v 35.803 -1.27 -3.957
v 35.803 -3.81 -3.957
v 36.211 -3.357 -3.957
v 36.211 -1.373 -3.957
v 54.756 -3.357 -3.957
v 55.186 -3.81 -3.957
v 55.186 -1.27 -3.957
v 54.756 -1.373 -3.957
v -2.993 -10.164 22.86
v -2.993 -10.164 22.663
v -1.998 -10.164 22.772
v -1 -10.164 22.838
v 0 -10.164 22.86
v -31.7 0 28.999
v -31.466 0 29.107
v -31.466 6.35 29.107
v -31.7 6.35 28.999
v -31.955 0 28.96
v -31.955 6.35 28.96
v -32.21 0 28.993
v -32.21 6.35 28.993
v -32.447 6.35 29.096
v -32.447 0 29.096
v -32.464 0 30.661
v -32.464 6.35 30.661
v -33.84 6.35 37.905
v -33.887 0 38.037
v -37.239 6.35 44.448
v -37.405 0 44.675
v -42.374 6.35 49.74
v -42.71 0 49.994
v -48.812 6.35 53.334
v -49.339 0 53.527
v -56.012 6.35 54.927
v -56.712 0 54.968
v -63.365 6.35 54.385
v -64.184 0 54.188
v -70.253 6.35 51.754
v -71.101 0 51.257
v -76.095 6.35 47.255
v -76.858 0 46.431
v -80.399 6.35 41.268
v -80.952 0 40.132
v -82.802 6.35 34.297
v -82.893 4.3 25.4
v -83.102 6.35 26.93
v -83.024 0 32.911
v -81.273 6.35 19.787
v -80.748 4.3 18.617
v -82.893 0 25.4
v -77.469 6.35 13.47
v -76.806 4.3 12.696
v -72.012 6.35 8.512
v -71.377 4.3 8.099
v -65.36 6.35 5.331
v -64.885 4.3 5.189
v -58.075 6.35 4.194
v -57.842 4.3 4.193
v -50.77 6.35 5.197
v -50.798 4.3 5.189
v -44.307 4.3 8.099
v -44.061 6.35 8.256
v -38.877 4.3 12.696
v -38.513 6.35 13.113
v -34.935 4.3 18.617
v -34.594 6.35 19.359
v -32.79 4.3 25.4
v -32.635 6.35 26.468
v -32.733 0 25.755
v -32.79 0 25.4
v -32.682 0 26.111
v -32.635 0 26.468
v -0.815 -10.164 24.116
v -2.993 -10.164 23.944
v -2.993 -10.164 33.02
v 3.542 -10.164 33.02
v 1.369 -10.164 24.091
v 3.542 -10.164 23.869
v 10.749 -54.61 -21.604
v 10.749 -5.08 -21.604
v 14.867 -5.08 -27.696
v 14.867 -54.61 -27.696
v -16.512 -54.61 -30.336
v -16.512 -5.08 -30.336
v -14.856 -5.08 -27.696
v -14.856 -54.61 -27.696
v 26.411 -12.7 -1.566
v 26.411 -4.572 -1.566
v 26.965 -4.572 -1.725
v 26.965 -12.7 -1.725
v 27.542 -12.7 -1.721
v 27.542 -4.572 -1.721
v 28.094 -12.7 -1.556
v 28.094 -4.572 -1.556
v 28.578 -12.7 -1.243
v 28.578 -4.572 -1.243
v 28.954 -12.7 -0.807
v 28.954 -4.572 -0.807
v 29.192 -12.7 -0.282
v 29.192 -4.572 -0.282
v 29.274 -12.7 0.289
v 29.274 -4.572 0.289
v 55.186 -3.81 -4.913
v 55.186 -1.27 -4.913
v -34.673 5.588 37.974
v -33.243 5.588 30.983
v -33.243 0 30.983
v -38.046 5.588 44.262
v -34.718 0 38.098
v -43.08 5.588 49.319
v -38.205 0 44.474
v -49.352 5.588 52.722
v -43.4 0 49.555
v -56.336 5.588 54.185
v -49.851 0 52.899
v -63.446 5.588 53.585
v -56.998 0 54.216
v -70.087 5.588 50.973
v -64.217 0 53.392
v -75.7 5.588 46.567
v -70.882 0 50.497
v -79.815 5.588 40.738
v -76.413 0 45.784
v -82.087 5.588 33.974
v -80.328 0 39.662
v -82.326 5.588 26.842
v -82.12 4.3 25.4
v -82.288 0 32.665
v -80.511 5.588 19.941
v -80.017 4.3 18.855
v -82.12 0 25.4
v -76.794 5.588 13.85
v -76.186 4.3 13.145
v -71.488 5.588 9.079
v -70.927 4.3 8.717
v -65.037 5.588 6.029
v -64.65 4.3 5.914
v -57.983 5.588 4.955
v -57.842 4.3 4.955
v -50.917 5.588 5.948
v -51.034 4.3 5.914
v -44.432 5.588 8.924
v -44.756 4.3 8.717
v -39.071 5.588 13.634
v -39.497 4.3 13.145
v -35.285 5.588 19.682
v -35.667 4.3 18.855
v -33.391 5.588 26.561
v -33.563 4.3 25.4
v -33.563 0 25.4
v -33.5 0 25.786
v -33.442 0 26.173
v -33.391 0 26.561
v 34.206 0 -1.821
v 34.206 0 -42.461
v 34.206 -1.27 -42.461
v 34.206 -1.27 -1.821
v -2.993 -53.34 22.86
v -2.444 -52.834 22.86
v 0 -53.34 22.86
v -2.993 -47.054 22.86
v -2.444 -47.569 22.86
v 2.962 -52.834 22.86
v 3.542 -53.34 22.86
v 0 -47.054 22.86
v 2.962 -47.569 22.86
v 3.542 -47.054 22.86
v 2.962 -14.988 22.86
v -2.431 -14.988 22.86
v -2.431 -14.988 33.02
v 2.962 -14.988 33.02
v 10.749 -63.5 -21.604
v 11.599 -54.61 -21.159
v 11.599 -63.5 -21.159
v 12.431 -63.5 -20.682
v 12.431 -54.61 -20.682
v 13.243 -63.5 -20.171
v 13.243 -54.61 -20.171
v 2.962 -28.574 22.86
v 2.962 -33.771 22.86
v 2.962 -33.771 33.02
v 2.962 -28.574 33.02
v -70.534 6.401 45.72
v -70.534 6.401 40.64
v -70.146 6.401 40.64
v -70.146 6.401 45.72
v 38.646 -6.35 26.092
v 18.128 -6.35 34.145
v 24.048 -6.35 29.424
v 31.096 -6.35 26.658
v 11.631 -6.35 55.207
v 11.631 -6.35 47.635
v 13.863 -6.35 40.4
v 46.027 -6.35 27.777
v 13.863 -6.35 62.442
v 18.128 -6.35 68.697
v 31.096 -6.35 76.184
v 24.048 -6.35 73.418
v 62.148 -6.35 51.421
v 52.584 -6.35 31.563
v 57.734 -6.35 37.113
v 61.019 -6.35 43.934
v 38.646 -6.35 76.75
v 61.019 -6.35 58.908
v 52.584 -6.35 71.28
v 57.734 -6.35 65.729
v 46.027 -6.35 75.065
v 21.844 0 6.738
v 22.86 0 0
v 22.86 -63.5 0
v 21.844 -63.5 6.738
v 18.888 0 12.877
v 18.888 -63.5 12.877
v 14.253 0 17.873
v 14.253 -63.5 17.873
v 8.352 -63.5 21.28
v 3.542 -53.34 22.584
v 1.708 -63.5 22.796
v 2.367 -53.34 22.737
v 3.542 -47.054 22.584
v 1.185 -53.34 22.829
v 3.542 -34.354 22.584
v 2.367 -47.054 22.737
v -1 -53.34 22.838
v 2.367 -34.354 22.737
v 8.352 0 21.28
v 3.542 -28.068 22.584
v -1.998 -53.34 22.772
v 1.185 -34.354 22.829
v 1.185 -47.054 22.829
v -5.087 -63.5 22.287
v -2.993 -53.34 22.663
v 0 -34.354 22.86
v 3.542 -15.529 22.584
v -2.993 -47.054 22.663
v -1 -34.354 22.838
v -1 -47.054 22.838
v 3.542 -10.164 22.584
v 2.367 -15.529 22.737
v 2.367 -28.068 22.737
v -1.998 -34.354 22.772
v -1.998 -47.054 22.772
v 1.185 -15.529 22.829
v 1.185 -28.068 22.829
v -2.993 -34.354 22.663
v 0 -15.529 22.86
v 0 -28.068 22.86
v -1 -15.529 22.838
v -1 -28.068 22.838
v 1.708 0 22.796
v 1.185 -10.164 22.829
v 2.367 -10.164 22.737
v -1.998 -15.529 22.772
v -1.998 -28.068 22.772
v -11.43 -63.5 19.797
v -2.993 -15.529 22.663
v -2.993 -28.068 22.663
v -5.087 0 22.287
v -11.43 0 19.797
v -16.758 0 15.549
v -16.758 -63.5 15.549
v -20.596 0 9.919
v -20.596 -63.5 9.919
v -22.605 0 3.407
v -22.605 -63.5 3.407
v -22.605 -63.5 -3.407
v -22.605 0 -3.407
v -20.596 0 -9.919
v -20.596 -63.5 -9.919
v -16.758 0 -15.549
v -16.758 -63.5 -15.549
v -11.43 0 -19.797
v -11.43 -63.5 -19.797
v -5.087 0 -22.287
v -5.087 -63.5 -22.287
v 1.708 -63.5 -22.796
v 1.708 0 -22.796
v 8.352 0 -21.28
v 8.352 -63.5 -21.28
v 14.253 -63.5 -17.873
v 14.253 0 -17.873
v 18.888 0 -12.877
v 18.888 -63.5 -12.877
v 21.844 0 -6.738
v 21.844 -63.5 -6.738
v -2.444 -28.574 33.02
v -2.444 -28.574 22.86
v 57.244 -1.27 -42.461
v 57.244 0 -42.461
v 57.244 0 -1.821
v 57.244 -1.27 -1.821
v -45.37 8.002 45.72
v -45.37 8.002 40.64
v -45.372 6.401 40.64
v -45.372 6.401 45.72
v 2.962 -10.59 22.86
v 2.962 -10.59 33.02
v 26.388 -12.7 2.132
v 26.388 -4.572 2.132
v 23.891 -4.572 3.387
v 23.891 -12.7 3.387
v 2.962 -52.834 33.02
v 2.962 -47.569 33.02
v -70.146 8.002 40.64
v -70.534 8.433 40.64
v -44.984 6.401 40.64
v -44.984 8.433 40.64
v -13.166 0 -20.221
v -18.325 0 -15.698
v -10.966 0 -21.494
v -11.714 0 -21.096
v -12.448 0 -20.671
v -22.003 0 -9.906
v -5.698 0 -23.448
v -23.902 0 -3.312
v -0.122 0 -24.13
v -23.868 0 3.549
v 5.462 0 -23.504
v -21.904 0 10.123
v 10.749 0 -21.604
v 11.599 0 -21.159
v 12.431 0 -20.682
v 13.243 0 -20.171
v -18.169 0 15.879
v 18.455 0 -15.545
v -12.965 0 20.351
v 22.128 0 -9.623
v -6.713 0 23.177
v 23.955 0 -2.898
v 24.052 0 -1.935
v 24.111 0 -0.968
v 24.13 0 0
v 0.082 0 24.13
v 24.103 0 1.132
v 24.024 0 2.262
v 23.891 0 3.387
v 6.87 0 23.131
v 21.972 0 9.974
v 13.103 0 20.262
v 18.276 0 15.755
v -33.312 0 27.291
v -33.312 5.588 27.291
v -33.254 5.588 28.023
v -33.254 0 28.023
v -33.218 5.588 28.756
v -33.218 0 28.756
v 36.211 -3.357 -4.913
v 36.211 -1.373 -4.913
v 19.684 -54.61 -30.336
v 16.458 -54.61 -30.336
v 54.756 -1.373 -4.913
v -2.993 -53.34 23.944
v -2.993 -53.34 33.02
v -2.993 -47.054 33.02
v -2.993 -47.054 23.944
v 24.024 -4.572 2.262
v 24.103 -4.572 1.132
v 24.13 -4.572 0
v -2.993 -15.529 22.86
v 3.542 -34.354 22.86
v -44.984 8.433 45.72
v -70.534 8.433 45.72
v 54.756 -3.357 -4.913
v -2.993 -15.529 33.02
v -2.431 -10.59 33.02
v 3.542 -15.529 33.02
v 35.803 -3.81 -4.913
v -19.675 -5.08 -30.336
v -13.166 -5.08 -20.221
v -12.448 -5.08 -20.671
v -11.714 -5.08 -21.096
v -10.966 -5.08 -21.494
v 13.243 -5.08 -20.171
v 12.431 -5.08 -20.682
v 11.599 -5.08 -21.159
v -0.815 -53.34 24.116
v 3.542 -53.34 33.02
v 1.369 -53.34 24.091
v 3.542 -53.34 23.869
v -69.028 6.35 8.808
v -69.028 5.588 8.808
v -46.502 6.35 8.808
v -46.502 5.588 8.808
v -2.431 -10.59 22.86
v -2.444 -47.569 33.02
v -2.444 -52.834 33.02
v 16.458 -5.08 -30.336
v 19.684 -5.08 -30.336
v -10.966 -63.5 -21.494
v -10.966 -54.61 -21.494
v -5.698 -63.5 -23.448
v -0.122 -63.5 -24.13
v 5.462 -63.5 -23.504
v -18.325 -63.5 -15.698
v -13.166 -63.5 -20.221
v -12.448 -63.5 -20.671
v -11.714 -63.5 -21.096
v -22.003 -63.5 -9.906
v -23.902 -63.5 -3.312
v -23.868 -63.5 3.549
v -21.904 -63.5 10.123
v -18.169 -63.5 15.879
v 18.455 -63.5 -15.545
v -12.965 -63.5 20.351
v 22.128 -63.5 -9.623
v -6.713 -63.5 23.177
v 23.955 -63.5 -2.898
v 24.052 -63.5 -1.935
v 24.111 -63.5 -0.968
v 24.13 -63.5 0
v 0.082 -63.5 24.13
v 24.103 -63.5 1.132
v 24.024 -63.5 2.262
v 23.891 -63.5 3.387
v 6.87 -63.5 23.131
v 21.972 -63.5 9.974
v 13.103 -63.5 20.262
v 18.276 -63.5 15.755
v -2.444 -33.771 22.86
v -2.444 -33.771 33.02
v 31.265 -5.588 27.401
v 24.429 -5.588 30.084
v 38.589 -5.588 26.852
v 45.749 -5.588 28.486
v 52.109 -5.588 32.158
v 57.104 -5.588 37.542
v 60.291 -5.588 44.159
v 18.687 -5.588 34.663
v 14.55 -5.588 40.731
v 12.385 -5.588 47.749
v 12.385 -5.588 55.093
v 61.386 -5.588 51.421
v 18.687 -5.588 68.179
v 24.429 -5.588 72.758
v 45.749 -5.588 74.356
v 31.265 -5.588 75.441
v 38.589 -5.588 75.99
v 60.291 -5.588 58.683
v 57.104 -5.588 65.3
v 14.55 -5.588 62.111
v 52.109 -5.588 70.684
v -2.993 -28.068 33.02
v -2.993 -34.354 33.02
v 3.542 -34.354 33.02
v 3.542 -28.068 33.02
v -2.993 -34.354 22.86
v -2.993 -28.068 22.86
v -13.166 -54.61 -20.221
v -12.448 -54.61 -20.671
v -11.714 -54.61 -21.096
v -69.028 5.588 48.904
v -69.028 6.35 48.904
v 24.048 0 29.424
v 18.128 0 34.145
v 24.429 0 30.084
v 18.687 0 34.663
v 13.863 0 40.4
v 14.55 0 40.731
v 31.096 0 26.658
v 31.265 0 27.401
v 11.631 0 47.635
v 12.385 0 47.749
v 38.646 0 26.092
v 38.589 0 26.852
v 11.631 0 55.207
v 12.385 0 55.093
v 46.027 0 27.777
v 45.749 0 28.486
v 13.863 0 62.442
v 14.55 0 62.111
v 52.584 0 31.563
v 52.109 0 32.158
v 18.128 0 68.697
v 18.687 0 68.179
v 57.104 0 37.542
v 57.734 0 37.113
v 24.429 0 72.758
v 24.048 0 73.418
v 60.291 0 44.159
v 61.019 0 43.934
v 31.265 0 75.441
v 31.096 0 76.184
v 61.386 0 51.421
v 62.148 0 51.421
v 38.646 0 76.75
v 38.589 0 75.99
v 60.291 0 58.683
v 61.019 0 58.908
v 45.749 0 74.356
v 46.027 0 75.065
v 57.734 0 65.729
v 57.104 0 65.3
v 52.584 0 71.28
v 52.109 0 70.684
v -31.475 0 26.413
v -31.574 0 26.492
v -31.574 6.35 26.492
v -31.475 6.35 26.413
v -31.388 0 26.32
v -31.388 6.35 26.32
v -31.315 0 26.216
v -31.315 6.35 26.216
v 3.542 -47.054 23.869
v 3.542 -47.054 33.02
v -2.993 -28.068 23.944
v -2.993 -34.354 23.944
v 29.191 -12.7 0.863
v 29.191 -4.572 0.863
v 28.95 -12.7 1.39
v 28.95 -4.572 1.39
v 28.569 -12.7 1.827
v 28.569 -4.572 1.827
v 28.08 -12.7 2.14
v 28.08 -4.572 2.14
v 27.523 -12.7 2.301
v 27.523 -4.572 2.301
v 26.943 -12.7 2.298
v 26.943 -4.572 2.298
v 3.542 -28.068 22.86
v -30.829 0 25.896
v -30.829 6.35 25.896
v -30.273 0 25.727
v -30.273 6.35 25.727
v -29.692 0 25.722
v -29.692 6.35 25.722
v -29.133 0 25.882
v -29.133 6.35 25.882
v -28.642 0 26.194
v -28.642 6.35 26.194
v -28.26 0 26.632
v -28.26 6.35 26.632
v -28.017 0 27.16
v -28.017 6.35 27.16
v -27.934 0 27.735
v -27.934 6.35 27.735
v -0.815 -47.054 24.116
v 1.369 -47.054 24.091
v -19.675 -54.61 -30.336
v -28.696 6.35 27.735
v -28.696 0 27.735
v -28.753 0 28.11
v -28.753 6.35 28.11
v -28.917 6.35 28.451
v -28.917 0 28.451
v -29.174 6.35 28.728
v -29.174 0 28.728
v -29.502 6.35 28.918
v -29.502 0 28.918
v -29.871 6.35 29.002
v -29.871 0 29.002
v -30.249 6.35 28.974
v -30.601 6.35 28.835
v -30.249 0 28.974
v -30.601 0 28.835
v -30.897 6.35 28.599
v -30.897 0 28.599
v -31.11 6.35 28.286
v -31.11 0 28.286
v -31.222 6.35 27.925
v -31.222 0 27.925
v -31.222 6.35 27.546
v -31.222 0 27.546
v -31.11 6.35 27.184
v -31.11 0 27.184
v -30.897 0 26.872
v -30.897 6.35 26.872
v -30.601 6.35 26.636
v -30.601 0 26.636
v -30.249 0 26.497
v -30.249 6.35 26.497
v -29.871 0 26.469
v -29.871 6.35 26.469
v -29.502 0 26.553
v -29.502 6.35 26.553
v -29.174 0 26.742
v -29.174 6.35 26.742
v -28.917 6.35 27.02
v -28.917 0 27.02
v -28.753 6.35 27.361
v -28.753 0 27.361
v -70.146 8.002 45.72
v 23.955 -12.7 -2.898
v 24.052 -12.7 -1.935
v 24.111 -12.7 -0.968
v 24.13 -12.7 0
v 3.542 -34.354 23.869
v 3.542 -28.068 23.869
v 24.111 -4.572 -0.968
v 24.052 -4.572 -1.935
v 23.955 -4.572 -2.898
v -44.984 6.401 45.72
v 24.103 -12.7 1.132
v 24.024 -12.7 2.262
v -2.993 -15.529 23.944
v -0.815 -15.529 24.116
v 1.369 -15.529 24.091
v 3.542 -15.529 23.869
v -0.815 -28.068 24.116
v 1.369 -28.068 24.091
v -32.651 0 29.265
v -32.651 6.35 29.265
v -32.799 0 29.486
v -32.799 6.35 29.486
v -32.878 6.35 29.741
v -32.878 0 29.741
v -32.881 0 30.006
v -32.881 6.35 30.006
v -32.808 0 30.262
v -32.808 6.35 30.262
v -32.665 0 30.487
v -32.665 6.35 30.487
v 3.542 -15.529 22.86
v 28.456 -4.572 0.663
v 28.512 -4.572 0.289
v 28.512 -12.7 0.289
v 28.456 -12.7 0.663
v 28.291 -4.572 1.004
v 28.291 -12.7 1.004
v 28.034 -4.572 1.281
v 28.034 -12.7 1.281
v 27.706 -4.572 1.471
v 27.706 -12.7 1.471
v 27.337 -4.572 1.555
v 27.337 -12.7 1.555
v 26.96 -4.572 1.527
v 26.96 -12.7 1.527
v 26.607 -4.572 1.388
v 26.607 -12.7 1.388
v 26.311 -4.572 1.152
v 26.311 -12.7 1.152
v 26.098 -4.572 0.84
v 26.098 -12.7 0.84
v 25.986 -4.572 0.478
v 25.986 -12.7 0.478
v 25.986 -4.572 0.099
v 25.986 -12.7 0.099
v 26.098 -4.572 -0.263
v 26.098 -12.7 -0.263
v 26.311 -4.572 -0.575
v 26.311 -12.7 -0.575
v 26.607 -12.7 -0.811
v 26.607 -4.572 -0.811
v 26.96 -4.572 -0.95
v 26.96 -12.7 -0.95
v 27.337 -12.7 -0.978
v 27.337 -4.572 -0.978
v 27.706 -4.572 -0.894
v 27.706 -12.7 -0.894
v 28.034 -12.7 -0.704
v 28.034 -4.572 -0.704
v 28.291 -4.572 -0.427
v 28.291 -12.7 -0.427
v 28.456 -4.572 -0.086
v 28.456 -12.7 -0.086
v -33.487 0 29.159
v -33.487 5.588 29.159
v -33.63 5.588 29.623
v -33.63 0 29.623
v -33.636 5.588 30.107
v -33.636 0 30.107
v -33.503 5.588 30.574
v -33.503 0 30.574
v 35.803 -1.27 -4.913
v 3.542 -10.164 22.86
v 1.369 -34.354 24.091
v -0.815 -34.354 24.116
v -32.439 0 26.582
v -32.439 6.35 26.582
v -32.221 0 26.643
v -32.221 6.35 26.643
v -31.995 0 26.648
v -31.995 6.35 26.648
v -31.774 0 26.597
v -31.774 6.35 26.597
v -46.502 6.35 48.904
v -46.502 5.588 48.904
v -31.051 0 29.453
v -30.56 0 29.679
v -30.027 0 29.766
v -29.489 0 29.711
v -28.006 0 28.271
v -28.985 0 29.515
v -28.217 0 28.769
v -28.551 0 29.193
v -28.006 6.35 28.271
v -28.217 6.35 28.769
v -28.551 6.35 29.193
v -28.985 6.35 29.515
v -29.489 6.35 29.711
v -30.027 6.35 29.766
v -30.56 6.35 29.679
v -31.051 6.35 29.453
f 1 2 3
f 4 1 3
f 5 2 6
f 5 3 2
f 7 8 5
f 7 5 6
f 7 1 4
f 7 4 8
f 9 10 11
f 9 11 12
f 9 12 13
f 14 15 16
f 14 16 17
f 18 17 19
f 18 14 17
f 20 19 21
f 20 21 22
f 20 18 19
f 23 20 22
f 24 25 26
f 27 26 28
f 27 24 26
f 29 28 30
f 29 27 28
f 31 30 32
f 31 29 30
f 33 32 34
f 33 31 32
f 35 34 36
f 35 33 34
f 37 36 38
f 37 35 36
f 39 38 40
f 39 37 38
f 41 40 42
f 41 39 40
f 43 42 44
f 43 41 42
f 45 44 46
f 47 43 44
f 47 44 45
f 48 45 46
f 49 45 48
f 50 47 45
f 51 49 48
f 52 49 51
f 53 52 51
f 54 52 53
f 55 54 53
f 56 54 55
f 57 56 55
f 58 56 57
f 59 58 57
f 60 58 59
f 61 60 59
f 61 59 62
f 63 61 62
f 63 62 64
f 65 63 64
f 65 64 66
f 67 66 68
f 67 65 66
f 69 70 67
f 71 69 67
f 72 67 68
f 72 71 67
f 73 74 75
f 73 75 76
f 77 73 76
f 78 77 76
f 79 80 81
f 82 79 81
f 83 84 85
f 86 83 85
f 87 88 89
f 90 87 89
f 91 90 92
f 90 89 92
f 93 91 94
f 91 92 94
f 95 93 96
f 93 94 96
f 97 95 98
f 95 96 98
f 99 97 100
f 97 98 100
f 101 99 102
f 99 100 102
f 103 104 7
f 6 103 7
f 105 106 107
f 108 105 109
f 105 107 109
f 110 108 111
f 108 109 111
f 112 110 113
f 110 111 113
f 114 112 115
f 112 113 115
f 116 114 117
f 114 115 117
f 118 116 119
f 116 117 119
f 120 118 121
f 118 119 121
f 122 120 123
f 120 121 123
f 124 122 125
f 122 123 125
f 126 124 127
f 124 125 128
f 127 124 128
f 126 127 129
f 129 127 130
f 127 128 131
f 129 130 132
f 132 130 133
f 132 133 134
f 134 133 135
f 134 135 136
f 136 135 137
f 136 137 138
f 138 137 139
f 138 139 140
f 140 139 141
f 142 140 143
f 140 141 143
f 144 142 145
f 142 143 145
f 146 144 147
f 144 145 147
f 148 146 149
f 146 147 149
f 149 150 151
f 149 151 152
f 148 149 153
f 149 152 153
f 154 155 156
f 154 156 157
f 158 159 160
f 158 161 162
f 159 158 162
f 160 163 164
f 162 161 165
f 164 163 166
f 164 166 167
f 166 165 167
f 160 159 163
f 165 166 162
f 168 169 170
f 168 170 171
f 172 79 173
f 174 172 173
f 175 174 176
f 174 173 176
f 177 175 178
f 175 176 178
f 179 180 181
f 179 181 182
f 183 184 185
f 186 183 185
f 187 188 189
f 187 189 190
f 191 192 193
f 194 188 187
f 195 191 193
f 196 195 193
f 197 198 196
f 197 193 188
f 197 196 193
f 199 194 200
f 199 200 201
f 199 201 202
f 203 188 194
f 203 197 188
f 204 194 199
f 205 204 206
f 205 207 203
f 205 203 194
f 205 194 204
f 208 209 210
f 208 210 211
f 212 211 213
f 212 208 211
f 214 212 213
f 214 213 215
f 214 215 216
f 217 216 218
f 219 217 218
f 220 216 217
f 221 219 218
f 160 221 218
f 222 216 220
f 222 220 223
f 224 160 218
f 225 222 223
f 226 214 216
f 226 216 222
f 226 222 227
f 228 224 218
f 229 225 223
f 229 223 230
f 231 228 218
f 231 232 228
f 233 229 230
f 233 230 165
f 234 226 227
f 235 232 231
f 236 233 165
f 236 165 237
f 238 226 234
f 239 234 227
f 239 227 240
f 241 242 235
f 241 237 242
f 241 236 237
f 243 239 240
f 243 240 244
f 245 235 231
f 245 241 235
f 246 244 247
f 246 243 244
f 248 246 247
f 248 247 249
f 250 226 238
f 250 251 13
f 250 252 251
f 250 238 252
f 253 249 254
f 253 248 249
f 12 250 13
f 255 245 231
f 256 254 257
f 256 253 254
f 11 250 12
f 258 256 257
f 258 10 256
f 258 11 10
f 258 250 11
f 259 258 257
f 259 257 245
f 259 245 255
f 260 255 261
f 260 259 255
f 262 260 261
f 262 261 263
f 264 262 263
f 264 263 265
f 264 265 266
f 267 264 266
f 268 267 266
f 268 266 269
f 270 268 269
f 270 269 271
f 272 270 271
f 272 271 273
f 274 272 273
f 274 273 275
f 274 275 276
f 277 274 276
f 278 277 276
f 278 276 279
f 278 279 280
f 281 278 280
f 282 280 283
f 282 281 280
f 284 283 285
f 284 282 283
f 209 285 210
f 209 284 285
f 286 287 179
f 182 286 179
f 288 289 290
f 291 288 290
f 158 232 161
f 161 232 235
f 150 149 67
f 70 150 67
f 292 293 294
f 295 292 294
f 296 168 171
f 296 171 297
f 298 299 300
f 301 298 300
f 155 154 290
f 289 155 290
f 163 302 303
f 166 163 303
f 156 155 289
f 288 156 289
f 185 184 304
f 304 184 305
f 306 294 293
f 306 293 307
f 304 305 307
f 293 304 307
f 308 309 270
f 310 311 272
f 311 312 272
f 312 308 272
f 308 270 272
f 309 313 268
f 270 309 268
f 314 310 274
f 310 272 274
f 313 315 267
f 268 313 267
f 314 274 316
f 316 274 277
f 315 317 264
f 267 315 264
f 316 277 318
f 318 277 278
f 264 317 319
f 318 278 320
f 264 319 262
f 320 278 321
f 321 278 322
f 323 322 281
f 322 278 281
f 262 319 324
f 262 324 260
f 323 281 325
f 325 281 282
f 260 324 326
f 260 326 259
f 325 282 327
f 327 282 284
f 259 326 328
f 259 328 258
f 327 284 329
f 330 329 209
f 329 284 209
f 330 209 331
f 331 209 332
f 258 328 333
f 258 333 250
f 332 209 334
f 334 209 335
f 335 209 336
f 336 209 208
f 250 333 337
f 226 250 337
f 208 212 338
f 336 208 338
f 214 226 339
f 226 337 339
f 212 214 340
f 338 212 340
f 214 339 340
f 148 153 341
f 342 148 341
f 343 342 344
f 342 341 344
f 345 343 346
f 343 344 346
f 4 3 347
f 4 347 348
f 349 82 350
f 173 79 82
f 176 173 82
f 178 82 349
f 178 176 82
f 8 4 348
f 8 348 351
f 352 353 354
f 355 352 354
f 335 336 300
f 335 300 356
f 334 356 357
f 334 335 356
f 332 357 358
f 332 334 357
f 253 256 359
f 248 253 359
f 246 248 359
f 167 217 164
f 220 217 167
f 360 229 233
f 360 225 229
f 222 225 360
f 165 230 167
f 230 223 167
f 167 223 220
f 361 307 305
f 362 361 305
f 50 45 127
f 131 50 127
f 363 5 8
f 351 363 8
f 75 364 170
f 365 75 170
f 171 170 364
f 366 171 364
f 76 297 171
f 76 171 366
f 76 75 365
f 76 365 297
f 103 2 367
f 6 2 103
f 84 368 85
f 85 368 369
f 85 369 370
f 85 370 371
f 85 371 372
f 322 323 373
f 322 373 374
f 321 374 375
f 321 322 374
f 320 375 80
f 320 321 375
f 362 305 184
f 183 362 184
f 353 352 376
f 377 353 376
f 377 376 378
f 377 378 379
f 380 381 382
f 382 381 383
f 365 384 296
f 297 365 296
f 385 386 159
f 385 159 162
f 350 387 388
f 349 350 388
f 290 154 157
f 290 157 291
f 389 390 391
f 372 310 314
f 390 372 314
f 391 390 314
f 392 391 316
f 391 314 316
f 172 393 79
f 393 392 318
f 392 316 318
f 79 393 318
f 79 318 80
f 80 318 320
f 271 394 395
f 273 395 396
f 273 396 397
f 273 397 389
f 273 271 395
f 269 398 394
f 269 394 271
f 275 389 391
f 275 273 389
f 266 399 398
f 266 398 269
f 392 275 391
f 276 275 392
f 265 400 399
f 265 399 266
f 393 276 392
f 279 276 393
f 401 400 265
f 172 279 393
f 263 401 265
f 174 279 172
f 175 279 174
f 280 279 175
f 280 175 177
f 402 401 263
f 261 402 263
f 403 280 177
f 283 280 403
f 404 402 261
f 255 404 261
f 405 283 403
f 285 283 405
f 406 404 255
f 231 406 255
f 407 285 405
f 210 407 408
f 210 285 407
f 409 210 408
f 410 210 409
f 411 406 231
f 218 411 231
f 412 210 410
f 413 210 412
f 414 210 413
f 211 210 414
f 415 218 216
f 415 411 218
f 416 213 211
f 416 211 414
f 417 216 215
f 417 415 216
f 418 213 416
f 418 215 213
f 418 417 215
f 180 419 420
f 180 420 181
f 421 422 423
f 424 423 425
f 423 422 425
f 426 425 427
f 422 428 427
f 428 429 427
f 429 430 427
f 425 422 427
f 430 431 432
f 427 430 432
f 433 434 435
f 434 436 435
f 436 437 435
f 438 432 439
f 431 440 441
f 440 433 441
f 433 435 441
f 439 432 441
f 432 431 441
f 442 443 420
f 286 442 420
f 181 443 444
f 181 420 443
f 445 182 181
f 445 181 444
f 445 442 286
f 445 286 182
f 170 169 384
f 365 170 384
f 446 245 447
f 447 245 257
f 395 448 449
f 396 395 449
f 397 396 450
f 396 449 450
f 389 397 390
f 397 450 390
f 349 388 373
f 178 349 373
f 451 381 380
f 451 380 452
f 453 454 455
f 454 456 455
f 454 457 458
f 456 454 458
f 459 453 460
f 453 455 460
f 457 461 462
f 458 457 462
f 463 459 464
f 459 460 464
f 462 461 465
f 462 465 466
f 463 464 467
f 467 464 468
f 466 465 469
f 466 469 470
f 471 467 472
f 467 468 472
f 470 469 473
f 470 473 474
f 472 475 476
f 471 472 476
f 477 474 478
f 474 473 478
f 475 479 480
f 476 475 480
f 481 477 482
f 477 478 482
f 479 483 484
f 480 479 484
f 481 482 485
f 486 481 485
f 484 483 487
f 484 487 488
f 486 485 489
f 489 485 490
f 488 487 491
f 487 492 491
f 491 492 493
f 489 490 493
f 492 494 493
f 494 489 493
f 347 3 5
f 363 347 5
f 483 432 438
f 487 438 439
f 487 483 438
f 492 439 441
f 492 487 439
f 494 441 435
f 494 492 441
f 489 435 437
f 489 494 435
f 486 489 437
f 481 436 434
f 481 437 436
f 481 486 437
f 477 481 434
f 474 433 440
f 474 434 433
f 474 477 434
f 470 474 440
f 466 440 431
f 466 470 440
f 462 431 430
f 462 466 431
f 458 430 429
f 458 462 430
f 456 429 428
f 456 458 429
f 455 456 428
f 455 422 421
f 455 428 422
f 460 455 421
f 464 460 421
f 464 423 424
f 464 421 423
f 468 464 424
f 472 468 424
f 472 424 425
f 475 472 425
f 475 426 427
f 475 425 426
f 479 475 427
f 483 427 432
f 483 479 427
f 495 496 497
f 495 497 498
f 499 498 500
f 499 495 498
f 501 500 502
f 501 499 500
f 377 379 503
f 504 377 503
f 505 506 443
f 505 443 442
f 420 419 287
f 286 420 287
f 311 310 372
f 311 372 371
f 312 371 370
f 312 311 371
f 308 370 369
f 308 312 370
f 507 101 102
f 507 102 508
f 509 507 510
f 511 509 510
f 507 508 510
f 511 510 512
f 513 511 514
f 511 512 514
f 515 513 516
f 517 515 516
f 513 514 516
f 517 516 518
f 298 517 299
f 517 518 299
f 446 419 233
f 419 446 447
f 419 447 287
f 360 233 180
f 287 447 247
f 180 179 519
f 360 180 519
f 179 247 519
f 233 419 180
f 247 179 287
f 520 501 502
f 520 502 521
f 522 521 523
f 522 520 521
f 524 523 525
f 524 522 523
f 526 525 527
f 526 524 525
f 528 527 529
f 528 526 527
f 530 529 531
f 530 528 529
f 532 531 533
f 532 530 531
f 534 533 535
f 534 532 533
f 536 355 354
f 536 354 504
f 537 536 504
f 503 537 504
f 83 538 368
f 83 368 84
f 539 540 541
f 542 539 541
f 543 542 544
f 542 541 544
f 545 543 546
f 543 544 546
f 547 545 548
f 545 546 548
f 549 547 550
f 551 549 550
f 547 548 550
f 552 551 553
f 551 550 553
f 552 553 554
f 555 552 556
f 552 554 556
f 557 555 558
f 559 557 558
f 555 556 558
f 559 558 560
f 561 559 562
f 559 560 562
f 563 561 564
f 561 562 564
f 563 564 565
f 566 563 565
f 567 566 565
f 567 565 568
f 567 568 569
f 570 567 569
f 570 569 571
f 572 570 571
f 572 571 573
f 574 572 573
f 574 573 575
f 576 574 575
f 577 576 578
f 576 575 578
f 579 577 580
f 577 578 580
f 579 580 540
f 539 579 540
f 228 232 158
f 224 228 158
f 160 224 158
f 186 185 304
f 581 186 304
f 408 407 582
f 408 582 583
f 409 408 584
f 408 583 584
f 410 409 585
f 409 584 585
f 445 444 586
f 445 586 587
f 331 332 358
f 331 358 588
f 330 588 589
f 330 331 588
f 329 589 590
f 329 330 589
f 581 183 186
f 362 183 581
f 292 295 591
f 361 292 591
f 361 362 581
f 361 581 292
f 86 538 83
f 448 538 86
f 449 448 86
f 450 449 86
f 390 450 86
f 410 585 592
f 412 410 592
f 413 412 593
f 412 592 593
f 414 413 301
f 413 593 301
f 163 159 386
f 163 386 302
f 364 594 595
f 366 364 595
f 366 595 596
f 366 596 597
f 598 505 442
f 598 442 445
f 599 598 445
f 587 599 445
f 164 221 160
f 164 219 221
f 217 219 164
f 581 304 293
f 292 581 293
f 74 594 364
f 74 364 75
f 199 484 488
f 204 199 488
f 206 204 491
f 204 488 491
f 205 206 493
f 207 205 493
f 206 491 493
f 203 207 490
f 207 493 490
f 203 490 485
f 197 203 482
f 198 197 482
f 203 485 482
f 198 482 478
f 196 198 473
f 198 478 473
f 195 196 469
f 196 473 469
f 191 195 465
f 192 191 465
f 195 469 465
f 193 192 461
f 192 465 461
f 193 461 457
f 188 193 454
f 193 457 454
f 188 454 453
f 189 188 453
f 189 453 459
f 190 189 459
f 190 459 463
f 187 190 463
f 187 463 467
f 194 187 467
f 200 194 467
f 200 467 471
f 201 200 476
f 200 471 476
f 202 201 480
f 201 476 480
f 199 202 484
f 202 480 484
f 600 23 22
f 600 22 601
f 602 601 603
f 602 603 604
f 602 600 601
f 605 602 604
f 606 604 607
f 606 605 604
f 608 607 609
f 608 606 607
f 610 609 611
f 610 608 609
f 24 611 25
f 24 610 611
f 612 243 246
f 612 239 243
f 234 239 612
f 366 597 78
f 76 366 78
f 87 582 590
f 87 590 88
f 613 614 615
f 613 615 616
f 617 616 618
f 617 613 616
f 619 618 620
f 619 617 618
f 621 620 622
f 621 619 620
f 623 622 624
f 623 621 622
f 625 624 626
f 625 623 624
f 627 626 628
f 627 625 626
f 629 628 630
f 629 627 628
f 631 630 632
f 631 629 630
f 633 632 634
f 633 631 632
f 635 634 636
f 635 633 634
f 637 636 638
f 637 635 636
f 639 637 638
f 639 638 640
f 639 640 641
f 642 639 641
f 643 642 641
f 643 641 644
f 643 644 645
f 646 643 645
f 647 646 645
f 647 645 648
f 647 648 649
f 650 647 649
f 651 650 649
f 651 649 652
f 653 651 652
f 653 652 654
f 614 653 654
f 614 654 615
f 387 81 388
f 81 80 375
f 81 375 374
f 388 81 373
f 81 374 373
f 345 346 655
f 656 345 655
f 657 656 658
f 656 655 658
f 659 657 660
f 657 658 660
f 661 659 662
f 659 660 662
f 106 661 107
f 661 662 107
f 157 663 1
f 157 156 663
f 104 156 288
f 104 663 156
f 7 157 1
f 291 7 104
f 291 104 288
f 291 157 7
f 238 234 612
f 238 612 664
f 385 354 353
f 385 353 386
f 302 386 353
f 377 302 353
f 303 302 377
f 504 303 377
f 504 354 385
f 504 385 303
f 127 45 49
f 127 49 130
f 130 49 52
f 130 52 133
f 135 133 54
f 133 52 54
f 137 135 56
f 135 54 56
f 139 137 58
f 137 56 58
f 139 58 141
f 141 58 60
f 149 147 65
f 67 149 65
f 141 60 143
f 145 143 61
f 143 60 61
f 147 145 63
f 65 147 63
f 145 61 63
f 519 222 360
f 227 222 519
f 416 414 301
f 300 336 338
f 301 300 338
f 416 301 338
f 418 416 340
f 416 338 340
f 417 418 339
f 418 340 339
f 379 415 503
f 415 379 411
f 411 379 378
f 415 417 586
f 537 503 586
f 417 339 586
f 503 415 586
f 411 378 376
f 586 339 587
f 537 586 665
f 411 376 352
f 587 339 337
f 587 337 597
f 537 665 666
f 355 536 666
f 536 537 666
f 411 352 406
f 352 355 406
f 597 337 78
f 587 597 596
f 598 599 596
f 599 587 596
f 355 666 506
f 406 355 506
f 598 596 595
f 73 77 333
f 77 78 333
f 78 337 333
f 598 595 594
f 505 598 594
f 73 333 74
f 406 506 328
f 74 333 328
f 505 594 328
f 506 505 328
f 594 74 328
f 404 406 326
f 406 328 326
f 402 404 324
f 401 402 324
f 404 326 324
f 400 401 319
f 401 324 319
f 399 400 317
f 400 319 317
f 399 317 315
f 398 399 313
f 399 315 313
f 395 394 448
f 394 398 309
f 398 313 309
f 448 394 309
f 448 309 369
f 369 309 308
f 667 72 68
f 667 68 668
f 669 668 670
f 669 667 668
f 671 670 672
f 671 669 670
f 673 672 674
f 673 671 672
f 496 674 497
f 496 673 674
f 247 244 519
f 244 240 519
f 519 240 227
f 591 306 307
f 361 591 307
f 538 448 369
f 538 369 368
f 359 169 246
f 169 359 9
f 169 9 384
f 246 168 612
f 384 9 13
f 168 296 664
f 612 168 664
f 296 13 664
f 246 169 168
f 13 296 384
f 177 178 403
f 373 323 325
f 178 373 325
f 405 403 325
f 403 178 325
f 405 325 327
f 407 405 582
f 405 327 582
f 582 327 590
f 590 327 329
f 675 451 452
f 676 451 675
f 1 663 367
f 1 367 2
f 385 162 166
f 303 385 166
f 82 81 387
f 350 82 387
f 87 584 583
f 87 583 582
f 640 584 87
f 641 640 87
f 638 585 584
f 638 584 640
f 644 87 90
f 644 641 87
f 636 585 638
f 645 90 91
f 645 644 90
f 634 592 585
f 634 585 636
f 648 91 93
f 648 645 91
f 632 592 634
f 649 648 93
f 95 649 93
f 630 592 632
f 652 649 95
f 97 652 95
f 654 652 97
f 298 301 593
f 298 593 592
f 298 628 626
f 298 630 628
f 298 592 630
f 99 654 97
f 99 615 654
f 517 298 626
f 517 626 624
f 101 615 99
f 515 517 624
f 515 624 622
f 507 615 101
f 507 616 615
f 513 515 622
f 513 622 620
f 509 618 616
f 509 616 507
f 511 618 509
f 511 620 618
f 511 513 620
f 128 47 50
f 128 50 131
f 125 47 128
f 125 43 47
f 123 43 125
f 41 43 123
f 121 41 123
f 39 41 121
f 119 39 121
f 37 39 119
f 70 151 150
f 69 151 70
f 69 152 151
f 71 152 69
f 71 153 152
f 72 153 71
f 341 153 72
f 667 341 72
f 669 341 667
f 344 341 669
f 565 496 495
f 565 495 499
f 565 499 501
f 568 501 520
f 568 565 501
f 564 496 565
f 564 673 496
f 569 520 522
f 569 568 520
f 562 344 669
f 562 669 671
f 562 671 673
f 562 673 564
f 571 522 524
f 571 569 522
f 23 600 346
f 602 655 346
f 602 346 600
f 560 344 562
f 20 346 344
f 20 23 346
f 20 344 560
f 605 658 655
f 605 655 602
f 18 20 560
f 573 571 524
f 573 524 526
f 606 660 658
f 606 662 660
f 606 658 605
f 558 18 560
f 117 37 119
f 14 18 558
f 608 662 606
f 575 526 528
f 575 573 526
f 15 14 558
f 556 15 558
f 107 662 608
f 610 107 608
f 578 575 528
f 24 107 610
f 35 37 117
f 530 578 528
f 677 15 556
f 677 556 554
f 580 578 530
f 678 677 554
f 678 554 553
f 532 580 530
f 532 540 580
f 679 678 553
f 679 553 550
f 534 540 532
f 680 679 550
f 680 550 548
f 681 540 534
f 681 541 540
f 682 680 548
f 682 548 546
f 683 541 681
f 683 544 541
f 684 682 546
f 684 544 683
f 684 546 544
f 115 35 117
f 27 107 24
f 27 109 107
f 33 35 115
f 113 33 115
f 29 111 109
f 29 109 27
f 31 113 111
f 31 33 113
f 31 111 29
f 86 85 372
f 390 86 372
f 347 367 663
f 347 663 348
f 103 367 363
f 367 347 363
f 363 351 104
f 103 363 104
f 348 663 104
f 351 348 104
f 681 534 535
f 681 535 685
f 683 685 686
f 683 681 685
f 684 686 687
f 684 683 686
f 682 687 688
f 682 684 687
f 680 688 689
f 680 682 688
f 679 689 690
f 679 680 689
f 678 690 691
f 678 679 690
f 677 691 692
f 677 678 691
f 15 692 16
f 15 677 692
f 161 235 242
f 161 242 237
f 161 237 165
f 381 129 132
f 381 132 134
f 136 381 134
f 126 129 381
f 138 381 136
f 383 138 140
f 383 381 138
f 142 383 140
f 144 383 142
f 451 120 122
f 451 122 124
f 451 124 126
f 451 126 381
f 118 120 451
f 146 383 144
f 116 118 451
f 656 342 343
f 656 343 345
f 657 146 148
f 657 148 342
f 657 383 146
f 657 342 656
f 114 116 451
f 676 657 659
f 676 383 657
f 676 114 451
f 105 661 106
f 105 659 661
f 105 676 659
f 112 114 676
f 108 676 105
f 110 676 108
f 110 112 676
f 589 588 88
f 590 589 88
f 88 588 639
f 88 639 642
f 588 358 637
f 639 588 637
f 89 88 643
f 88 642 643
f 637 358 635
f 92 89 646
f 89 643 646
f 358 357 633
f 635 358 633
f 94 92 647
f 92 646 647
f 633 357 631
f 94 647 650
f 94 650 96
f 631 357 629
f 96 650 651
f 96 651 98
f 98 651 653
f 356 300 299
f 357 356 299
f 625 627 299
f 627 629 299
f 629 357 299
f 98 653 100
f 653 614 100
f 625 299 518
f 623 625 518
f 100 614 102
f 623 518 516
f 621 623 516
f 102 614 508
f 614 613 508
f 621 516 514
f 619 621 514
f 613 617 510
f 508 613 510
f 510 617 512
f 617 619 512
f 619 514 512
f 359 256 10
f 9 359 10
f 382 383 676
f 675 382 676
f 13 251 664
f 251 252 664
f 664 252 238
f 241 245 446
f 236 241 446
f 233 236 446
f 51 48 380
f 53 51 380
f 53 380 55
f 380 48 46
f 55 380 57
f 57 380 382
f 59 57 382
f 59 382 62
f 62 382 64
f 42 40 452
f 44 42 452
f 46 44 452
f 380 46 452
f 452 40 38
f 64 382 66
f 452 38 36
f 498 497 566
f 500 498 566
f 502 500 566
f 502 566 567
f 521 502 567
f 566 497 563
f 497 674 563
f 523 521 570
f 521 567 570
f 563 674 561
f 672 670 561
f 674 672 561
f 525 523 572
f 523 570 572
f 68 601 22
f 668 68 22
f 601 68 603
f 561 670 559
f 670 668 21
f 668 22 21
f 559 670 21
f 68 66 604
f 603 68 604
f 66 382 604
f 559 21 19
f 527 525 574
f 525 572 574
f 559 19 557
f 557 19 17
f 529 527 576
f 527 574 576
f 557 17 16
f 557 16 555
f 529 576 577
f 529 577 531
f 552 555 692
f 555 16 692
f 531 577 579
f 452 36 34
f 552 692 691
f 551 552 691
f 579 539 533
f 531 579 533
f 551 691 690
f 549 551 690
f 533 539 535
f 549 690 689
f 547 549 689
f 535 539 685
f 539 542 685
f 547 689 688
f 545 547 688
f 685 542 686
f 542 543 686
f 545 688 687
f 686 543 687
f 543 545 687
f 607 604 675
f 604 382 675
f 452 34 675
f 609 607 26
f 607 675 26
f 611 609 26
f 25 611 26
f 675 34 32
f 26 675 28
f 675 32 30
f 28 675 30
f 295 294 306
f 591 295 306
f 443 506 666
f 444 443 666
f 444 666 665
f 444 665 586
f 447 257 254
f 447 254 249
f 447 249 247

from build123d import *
from build123d import SkipClean  # not in build123d's __all__

# Parameters (mm, degrees)
F3_DEPTH  = 6.35
F0_R      = 25.4
F4_DEPTH  = 6.35
F0_R_2    = 22.86
F5_DEPTH  = 63.5
F0_R_3    = 1.27
F6_DEPTH  = 12.7
F7_T      = -0.762
F1_W      = 53.34
F1_H      = 6.3453992899
F8_DEPTH  = 25.4
F9_DEPTH  = 6.35
F10_T     = -0.762
F2_W      = 22.526679039
F2_H      = 40.0950905681
F11_DEPTH = 12.7
F12_DEPTH = 4.572
F13_DEPTH = 45.72
F14_DEPTH = 40.64
F2_W_2    = 23.0380557477
F2_H_2    = 40.64
F2_W_3    = 19.3826705217
F2_H_3    = 0.9563816711
F15_DEPTH = 1.27
F16_W     = 6.5349340439
F16_H     = 5.3656761461
F16_W_2   = 5.3930499125
F16_H_2   = 4.3982407078
F16_H_3   = 6.2861796468
F16_W_3   = 5.4061815608
F16_H_4   = 5.1973611116
F16_H_5   = 5.2650868893
F17_DEPTH = 33.02
F18_DEPTH = 22.86
F19_DEPTH = 76.8220646396
F20_DEPTH = 3.81
F21_W     = 18.5442268848
F21_H     = 1.9841159228
F22_DEPTH = 6.35
F23_DEPTH = 54.61
F24_DEPTH = 5.08


# Not quite as in the source:
# - after a boolean that leaves OpenCascade's solid faulty, fix() repairs it
# - a feature names something its author has since deleted; it is built from what else it names


with BuildPart() as f3:
    # F0 (on Front) → F3 (new body)
    with BuildSketch(Plane.XZ):
        with BuildLine():
            ThreePointArc((-32.4466640218, 29.0955113473), (-32.8887348811, 29.8733902735), (-32.4642711977, 30.661015089))
            ThreePointArc((-32.4642711977, 30.661015089), (-83.2208236821, 30.6247252425), (-32.6347884268, 26.467565851))
            ThreePointArc((-32.6347884268, 26.467565851), (-32.5066296075, 27.7790977549), (-32.4466640218, 29.0955113473))
        make_face()
    extrude(amount=-F3_DEPTH)

    # F7
    f7_openings = [f3.faces().sort_by_distance(p)[0] for p in [
        (-57.847912, 0, 29.592675),
    ]]
    offset(amount=F7_T, openings=f7_openings)

    # F1 (on Top) → F8 (cut)
    with BuildSketch(Plane.XY):
        with Locations((-57.7600412071, 1.1268389062)):
            Rectangle(F1_W, F1_H)
    extrude(amount=F8_DEPTH, mode=Mode.SUBTRACT)

    # F0 (on Front) → F9 (join)
    with BuildSketch(Plane.XZ):
        with BuildLine():
            ThreePointArc((-31.4657914959, 29.1065431926), (-31.9546424795, 28.9600756065), (-32.4466640218, 29.0955113473))
            ThreePointArc((-32.4466640218, 29.0955113473), (-32.5066296075, 27.7790977549), (-32.6347884268, 26.467565851))
            ThreePointArc((-32.6347884268, 26.467565851), (-32.1081809699, 26.6529955741), (-31.5735203503, 26.492254734))
            ThreePointArc((-31.5735203503, 26.492254734), (-31.9964212199, 27.8190453719), (-31.4657914959, 29.1065431926))
        make_face()
        with BuildLine():
            ThreePointArc((-27.9341442708, 27.7353822975), (-29.2307053411, 29.6296245156), (-31.4657914959, 29.1065431926))
            ThreePointArc((-31.4657914959, 29.1065431926), (-31.9964212199, 27.8190453719), (-31.5735203503, 26.492254734))
            ThreePointArc((-31.5735203503, 26.492254734), (-31.4295715741, 26.3677040501), (-31.3150311705, 26.2156691233))
            ThreePointArc((-31.3150311705, 26.2156691233), (-29.133051893, 25.8820120997), (-27.9341442708, 27.7353822975))
        make_face()
        with Locations((-29.9661442708, 27.7353822975)):
            Circle(F0_R_3, mode=Mode.SUBTRACT)
    extrude(amount=-F9_DEPTH)

    # F2 (on Front) → F11 (cut)
    with BuildSketch(Plane.XZ):
        with Locations((-57.7648580501, 28.8560400026)):
            Rectangle(F2_W, F2_H)
    extrude(amount=-F11_DEPTH, mode=Mode.SUBTRACT)


with BuildPart() as f4:
    # F0 (on Front) → F4 (new body)
    with BuildSketch(Plane.XZ):
        with Locations((36.7476053159, 51.4210646396)):
            Circle(F0_R)
    extrude(amount=F4_DEPTH)

    # F10
    f10_openings = [f4.faces().sort_by_distance(p)[0] for p in [
        (36.747605, 0, 51.421065),
    ]]
    offset(amount=F10_T, openings=f10_openings)


with BuildPart() as f5:
    # F0 (on Front) → F5 (new body)
    with BuildSketch(Plane.XZ):
        with BuildLine():
            ThreePointArc((23.9553467799, -2.897975268), (24.0862971189, -1.4516167195), (24.13, 0))
            ThreePointArc((24.13, 0), (24.0702094486, 1.6976210124), (23.8911340985, 3.38682912))
            ThreePointArc((23.8911340985, 3.38682912), (-12.9651224252, 20.3509827896), (-13.1661744724, -20.2214922734))
            ThreePointArc((-13.1661744724, -20.2214922734), (-12.0827697744, -20.8869235308), (-10.9658187558, -21.49436482))
            ThreePointArc((-10.9658187558, -21.49436482), (-0.1215595159, -24.1296938083), (10.7487009216, -21.6037572773))
            ThreePointArc((10.7487009216, -21.6037572773), (12.0173696309, -20.9246201197), (13.2432995784, -20.1710663148))
            ThreePointArc((13.2432995784, -20.1710663148), (20.5066999125, -12.7173959087), (23.9553467799, -2.897975268))
        make_face()
        Circle(F0_R_2, mode=Mode.SUBTRACT)
    extrude(amount=F5_DEPTH)

    # F0 (on Front) → F6 (join)
    with BuildSketch(Plane.XZ):
        with BuildLine():
            ThreePointArc((29.2741734921, 0.2885023588), (28.3358719352, 2.0010582602), (26.3875123546, 2.1320257082))
            ThreePointArc((26.3875123546, 2.1320257082), (25.2102157311, 0.2754005508), (26.4113560417, -1.5658887446))
            ThreePointArc((26.4113560417, -1.5658887446), (28.346891316, -1.4169660607), (29.2741734921, 0.2885023588))
        make_face()
        with Locations((27.2421734921, 0.2885023588)):
            Circle(F0_R_3, mode=Mode.SUBTRACT)
        with BuildLine():
            ThreePointArc((23.8911340985, 3.38682912), (24.0702094486, 1.6976210124), (24.13, 0))
            ThreePointArc((24.13, 0), (24.0862971189, -1.4516167195), (23.9553467799, -2.897975268))
            Line((23.9553467799, -2.897975268), (26.4113560417, -1.5658887446))
            ThreePointArc((26.4113560417, -1.5658887446), (25.2102157311, 0.2754005508), (26.3875123546, 2.1320257082))
            Line((26.3875123546, 2.1320257082), (23.8911340985, 3.38682912))
        make_face()
    extrude(amount=F6_DEPTH)

    # F0 (on Front) → F12 (cut)
    with BuildSketch(Plane.XZ):
        with BuildLine():
            ThreePointArc((29.2741734921, 0.2885023588), (28.3358719352, 2.0010582602), (26.3875123546, 2.1320257082))
            ThreePointArc((26.3875123546, 2.1320257082), (25.2102157311, 0.2754005508), (26.4113560417, -1.5658887446))
            ThreePointArc((26.4113560417, -1.5658887446), (28.346891316, -1.4169660607), (29.2741734921, 0.2885023588))
        make_face()
        with Locations((27.2421734921, 0.2885023588)):
            Circle(F0_R_3, mode=Mode.SUBTRACT)
        with BuildLine():
            ThreePointArc((23.8911340985, 3.38682912), (24.0702094486, 1.6976210124), (24.13, 0))
            ThreePointArc((24.13, 0), (24.0862971189, -1.4516167195), (23.9553467799, -2.897975268))
            Line((23.9553467799, -2.897975268), (26.4113560417, -1.5658887446))
            ThreePointArc((26.4113560417, -1.5658887446), (25.2102157311, 0.2754005508), (26.3875123546, 2.1320257082))
            Line((26.3875123546, 2.1320257082), (23.8911340985, 3.38682912))
        make_face()
    with SkipClean():  # cleaning this boolean's faces spoils the solid; the shape is the same uncleaned
        extrude(amount=F12_DEPTH, mode=Mode.SUBTRACT)

    # F16 (on Top) → F17 (join)
    with BuildSketch(Plane.XY):
        with Locations((0.2746605314, -12.8463576046)):
            Rectangle(F16_W, F16_H)
        with Locations((0.2654072596, -12.7893346362)):
            Rectangle(F16_W_2, F16_H_2, mode=Mode.SUBTRACT)
        with Locations((0.2746605314, -31.2107305297)):
            Rectangle(F16_W, F16_H_3)
        with Locations((0.2588414354, -31.1722606421)):
            Rectangle(F16_W_3, F16_H_4, mode=Mode.SUBTRACT)
        with Locations((0.2746605314, -50.1969101766)):
            Rectangle(F16_W, F16_H_3)
        with Locations((0.2588414354, -50.2017065883)):
            Rectangle(F16_W_3, F16_H_5, mode=Mode.SUBTRACT)
    extrude(amount=F17_DEPTH)

    add(f5.part.fix(), mode=Mode.REPLACE)

    # F16 (on Top) → F18 (cut)
    with BuildSketch(Plane.XY):
        with Locations((0.2746605314, -31.2107305297)):
            Rectangle(F16_W, F16_H_3)
        with Locations((0.2588414354, -31.1722606421)):
            Rectangle(F16_W_3, F16_H_4, mode=Mode.SUBTRACT)
        with Locations((0.2746605314, -12.8463576046)):
            Rectangle(F16_W, F16_H)
        with Locations((0.2654072596, -12.7893346362)):
            Rectangle(F16_W_2, F16_H_2, mode=Mode.SUBTRACT)
        with Locations((0.2746605314, -50.1969101766)):
            Rectangle(F16_W, F16_H_3)
        with Locations((0.2588414354, -50.2017065883)):
            Rectangle(F16_W_3, F16_H_5, mode=Mode.SUBTRACT)
    extrude(amount=F18_DEPTH, mode=Mode.SUBTRACT)

    # F16 (on Top) → F19 (cut, through all)
    with BuildSketch(Plane.XY):
        with Locations((0.2654072596, -12.7893346362)):
            Rectangle(F16_W_2, F16_H_2)
        with Locations((0.2588414354, -31.1722606421)):
            Rectangle(F16_W_3, F16_H_4)
        with Locations((0.2588414354, -50.2017065883)):
            Rectangle(F16_W_3, F16_H_5)
    extrude(amount=F19_DEPTH, mode=Mode.SUBTRACT)

    # F0 (on Front) → F23 (join)
    with BuildSketch(Plane.XZ):
        with BuildLine():
            Line((19.6842323282, -30.335681513), (13.2432995784, -20.1710663148))
            ThreePointArc((13.2432995784, -20.1710663148), (12.0173696309, -20.9246201197), (10.7487009216, -21.6037572773))
            Line((10.7487009216, -21.6037572773), (14.867214486, -27.6958085597))
            Line((14.867214486, -27.6958085597), (16.4580456913, -30.335681513))
            Line((16.4580456913, -30.335681513), (19.6842323282, -30.335681513))
        make_face()
        with BuildLine():
            ThreePointArc((-10.9658187558, -21.49436482), (-12.0827697744, -20.8869235308), (-13.1661744724, -20.2214922734))
            Line((-13.1661744724, -20.2214922734), (-19.6747548778, -30.335681513))
            Line((-19.6747548778, -30.335681513), (-16.5117273591, -30.335681513))
            Line((-16.5117273591, -30.335681513), (-14.8558095098, -27.6958085597))
            Line((-14.8558095098, -27.6958085597), (-10.9658187558, -21.49436482))
        make_face()
    extrude(amount=F23_DEPTH)

    # F0 (on Front) → F24 (cut)
    with BuildSketch(Plane.XZ):
        with BuildLine():
            Line((19.6842323282, -30.335681513), (13.2432995784, -20.1710663148))
            ThreePointArc((13.2432995784, -20.1710663148), (12.0173696309, -20.9246201197), (10.7487009216, -21.6037572773))
            Line((10.7487009216, -21.6037572773), (14.867214486, -27.6958085597))
            Line((14.867214486, -27.6958085597), (16.4580456913, -30.335681513))
            Line((16.4580456913, -30.335681513), (19.6842323282, -30.335681513))
        make_face()
        with BuildLine():
            ThreePointArc((-10.9658187558, -21.49436482), (-12.0827697744, -20.8869235308), (-13.1661744724, -20.2214922734))
            Line((-13.1661744724, -20.2214922734), (-19.6747548778, -30.335681513))
            Line((-19.6747548778, -30.335681513), (-16.5117273591, -30.335681513))
            Line((-16.5117273591, -30.335681513), (-14.8558095098, -27.6958085597))
            Line((-14.8558095098, -27.6958085597), (-10.9658187558, -21.49436482))
        make_face()
    with SkipClean():  # cleaning this boolean's faces spoils the solid; the shape is the same uncleaned
        extrude(amount=F24_DEPTH, mode=Mode.SUBTRACT)


with BuildPart() as f13:
    # F1 (on Top) → F13 (new body)
    with BuildSketch(Plane.XY):
        Polygon((-45.3702554693, 8.4333274387), (-70.1464414597, 8.4333274387), (-70.5341733992, 8.4333274387), (-70.5341733992, 6.4013274387), (-70.1464414597, 6.4013274387), (-70.1464414597, 8.0015274387), (-45.3702554693, 8.0015274387), (-45.371824471, 6.4013282079), (-44.9843034148, 6.4013274387), (-44.9843034148, 8.4333274387), align=None)
    extrude(amount=F13_DEPTH)

    # F1 (on Top) → F14 (cut)
    with BuildSketch(Plane.XY):
        Polygon((-45.3702554693, 8.4333274387), (-70.1464414597, 8.4333274387), (-70.5341733992, 8.4333274387), (-70.5341733992, 6.4013274387), (-70.1464414597, 6.4013274387), (-70.1464414597, 8.0015274387), (-45.3702554693, 8.0015274387), (-45.371824471, 6.4013282079), (-44.9843034148, 6.4013274387), (-44.9843034148, 8.4333274387), align=None)
    extrude(amount=F14_DEPTH, mode=Mode.SUBTRACT)


with BuildPart() as f15:
    # F2 (on Front) → F15 (new body)
    with BuildSketch(Plane.XZ):
        with Locations((45.7251425833, -22.1414213407)):
            Rectangle(F2_W_2, F2_H_2)
        with Locations((45.494813472, -4.4349143282)):
            Rectangle(F2_W_3, F2_H_3, mode=Mode.SUBTRACT)
    extrude(amount=F15_DEPTH)

    # F2 (on Front) → F20 (join)
    with BuildSketch(Plane.XZ):
        with Locations((45.494813472, -4.4349143282)):
            Rectangle(F2_W_3, F2_H_3)
    extrude(amount=F20_DEPTH)

    # F21 (on Top) → F22 (cut, symmetric)
    with BuildSketch(Plane.XY):
        with Locations((45.4835407436, -2.3654265096)):
            Rectangle(F21_W, F21_H)
    extrude(amount=F22_DEPTH, both=True, mode=Mode.SUBTRACT)


solid = Compound([f3.part, f4.part, f5.part, f13.part, f15.part])
